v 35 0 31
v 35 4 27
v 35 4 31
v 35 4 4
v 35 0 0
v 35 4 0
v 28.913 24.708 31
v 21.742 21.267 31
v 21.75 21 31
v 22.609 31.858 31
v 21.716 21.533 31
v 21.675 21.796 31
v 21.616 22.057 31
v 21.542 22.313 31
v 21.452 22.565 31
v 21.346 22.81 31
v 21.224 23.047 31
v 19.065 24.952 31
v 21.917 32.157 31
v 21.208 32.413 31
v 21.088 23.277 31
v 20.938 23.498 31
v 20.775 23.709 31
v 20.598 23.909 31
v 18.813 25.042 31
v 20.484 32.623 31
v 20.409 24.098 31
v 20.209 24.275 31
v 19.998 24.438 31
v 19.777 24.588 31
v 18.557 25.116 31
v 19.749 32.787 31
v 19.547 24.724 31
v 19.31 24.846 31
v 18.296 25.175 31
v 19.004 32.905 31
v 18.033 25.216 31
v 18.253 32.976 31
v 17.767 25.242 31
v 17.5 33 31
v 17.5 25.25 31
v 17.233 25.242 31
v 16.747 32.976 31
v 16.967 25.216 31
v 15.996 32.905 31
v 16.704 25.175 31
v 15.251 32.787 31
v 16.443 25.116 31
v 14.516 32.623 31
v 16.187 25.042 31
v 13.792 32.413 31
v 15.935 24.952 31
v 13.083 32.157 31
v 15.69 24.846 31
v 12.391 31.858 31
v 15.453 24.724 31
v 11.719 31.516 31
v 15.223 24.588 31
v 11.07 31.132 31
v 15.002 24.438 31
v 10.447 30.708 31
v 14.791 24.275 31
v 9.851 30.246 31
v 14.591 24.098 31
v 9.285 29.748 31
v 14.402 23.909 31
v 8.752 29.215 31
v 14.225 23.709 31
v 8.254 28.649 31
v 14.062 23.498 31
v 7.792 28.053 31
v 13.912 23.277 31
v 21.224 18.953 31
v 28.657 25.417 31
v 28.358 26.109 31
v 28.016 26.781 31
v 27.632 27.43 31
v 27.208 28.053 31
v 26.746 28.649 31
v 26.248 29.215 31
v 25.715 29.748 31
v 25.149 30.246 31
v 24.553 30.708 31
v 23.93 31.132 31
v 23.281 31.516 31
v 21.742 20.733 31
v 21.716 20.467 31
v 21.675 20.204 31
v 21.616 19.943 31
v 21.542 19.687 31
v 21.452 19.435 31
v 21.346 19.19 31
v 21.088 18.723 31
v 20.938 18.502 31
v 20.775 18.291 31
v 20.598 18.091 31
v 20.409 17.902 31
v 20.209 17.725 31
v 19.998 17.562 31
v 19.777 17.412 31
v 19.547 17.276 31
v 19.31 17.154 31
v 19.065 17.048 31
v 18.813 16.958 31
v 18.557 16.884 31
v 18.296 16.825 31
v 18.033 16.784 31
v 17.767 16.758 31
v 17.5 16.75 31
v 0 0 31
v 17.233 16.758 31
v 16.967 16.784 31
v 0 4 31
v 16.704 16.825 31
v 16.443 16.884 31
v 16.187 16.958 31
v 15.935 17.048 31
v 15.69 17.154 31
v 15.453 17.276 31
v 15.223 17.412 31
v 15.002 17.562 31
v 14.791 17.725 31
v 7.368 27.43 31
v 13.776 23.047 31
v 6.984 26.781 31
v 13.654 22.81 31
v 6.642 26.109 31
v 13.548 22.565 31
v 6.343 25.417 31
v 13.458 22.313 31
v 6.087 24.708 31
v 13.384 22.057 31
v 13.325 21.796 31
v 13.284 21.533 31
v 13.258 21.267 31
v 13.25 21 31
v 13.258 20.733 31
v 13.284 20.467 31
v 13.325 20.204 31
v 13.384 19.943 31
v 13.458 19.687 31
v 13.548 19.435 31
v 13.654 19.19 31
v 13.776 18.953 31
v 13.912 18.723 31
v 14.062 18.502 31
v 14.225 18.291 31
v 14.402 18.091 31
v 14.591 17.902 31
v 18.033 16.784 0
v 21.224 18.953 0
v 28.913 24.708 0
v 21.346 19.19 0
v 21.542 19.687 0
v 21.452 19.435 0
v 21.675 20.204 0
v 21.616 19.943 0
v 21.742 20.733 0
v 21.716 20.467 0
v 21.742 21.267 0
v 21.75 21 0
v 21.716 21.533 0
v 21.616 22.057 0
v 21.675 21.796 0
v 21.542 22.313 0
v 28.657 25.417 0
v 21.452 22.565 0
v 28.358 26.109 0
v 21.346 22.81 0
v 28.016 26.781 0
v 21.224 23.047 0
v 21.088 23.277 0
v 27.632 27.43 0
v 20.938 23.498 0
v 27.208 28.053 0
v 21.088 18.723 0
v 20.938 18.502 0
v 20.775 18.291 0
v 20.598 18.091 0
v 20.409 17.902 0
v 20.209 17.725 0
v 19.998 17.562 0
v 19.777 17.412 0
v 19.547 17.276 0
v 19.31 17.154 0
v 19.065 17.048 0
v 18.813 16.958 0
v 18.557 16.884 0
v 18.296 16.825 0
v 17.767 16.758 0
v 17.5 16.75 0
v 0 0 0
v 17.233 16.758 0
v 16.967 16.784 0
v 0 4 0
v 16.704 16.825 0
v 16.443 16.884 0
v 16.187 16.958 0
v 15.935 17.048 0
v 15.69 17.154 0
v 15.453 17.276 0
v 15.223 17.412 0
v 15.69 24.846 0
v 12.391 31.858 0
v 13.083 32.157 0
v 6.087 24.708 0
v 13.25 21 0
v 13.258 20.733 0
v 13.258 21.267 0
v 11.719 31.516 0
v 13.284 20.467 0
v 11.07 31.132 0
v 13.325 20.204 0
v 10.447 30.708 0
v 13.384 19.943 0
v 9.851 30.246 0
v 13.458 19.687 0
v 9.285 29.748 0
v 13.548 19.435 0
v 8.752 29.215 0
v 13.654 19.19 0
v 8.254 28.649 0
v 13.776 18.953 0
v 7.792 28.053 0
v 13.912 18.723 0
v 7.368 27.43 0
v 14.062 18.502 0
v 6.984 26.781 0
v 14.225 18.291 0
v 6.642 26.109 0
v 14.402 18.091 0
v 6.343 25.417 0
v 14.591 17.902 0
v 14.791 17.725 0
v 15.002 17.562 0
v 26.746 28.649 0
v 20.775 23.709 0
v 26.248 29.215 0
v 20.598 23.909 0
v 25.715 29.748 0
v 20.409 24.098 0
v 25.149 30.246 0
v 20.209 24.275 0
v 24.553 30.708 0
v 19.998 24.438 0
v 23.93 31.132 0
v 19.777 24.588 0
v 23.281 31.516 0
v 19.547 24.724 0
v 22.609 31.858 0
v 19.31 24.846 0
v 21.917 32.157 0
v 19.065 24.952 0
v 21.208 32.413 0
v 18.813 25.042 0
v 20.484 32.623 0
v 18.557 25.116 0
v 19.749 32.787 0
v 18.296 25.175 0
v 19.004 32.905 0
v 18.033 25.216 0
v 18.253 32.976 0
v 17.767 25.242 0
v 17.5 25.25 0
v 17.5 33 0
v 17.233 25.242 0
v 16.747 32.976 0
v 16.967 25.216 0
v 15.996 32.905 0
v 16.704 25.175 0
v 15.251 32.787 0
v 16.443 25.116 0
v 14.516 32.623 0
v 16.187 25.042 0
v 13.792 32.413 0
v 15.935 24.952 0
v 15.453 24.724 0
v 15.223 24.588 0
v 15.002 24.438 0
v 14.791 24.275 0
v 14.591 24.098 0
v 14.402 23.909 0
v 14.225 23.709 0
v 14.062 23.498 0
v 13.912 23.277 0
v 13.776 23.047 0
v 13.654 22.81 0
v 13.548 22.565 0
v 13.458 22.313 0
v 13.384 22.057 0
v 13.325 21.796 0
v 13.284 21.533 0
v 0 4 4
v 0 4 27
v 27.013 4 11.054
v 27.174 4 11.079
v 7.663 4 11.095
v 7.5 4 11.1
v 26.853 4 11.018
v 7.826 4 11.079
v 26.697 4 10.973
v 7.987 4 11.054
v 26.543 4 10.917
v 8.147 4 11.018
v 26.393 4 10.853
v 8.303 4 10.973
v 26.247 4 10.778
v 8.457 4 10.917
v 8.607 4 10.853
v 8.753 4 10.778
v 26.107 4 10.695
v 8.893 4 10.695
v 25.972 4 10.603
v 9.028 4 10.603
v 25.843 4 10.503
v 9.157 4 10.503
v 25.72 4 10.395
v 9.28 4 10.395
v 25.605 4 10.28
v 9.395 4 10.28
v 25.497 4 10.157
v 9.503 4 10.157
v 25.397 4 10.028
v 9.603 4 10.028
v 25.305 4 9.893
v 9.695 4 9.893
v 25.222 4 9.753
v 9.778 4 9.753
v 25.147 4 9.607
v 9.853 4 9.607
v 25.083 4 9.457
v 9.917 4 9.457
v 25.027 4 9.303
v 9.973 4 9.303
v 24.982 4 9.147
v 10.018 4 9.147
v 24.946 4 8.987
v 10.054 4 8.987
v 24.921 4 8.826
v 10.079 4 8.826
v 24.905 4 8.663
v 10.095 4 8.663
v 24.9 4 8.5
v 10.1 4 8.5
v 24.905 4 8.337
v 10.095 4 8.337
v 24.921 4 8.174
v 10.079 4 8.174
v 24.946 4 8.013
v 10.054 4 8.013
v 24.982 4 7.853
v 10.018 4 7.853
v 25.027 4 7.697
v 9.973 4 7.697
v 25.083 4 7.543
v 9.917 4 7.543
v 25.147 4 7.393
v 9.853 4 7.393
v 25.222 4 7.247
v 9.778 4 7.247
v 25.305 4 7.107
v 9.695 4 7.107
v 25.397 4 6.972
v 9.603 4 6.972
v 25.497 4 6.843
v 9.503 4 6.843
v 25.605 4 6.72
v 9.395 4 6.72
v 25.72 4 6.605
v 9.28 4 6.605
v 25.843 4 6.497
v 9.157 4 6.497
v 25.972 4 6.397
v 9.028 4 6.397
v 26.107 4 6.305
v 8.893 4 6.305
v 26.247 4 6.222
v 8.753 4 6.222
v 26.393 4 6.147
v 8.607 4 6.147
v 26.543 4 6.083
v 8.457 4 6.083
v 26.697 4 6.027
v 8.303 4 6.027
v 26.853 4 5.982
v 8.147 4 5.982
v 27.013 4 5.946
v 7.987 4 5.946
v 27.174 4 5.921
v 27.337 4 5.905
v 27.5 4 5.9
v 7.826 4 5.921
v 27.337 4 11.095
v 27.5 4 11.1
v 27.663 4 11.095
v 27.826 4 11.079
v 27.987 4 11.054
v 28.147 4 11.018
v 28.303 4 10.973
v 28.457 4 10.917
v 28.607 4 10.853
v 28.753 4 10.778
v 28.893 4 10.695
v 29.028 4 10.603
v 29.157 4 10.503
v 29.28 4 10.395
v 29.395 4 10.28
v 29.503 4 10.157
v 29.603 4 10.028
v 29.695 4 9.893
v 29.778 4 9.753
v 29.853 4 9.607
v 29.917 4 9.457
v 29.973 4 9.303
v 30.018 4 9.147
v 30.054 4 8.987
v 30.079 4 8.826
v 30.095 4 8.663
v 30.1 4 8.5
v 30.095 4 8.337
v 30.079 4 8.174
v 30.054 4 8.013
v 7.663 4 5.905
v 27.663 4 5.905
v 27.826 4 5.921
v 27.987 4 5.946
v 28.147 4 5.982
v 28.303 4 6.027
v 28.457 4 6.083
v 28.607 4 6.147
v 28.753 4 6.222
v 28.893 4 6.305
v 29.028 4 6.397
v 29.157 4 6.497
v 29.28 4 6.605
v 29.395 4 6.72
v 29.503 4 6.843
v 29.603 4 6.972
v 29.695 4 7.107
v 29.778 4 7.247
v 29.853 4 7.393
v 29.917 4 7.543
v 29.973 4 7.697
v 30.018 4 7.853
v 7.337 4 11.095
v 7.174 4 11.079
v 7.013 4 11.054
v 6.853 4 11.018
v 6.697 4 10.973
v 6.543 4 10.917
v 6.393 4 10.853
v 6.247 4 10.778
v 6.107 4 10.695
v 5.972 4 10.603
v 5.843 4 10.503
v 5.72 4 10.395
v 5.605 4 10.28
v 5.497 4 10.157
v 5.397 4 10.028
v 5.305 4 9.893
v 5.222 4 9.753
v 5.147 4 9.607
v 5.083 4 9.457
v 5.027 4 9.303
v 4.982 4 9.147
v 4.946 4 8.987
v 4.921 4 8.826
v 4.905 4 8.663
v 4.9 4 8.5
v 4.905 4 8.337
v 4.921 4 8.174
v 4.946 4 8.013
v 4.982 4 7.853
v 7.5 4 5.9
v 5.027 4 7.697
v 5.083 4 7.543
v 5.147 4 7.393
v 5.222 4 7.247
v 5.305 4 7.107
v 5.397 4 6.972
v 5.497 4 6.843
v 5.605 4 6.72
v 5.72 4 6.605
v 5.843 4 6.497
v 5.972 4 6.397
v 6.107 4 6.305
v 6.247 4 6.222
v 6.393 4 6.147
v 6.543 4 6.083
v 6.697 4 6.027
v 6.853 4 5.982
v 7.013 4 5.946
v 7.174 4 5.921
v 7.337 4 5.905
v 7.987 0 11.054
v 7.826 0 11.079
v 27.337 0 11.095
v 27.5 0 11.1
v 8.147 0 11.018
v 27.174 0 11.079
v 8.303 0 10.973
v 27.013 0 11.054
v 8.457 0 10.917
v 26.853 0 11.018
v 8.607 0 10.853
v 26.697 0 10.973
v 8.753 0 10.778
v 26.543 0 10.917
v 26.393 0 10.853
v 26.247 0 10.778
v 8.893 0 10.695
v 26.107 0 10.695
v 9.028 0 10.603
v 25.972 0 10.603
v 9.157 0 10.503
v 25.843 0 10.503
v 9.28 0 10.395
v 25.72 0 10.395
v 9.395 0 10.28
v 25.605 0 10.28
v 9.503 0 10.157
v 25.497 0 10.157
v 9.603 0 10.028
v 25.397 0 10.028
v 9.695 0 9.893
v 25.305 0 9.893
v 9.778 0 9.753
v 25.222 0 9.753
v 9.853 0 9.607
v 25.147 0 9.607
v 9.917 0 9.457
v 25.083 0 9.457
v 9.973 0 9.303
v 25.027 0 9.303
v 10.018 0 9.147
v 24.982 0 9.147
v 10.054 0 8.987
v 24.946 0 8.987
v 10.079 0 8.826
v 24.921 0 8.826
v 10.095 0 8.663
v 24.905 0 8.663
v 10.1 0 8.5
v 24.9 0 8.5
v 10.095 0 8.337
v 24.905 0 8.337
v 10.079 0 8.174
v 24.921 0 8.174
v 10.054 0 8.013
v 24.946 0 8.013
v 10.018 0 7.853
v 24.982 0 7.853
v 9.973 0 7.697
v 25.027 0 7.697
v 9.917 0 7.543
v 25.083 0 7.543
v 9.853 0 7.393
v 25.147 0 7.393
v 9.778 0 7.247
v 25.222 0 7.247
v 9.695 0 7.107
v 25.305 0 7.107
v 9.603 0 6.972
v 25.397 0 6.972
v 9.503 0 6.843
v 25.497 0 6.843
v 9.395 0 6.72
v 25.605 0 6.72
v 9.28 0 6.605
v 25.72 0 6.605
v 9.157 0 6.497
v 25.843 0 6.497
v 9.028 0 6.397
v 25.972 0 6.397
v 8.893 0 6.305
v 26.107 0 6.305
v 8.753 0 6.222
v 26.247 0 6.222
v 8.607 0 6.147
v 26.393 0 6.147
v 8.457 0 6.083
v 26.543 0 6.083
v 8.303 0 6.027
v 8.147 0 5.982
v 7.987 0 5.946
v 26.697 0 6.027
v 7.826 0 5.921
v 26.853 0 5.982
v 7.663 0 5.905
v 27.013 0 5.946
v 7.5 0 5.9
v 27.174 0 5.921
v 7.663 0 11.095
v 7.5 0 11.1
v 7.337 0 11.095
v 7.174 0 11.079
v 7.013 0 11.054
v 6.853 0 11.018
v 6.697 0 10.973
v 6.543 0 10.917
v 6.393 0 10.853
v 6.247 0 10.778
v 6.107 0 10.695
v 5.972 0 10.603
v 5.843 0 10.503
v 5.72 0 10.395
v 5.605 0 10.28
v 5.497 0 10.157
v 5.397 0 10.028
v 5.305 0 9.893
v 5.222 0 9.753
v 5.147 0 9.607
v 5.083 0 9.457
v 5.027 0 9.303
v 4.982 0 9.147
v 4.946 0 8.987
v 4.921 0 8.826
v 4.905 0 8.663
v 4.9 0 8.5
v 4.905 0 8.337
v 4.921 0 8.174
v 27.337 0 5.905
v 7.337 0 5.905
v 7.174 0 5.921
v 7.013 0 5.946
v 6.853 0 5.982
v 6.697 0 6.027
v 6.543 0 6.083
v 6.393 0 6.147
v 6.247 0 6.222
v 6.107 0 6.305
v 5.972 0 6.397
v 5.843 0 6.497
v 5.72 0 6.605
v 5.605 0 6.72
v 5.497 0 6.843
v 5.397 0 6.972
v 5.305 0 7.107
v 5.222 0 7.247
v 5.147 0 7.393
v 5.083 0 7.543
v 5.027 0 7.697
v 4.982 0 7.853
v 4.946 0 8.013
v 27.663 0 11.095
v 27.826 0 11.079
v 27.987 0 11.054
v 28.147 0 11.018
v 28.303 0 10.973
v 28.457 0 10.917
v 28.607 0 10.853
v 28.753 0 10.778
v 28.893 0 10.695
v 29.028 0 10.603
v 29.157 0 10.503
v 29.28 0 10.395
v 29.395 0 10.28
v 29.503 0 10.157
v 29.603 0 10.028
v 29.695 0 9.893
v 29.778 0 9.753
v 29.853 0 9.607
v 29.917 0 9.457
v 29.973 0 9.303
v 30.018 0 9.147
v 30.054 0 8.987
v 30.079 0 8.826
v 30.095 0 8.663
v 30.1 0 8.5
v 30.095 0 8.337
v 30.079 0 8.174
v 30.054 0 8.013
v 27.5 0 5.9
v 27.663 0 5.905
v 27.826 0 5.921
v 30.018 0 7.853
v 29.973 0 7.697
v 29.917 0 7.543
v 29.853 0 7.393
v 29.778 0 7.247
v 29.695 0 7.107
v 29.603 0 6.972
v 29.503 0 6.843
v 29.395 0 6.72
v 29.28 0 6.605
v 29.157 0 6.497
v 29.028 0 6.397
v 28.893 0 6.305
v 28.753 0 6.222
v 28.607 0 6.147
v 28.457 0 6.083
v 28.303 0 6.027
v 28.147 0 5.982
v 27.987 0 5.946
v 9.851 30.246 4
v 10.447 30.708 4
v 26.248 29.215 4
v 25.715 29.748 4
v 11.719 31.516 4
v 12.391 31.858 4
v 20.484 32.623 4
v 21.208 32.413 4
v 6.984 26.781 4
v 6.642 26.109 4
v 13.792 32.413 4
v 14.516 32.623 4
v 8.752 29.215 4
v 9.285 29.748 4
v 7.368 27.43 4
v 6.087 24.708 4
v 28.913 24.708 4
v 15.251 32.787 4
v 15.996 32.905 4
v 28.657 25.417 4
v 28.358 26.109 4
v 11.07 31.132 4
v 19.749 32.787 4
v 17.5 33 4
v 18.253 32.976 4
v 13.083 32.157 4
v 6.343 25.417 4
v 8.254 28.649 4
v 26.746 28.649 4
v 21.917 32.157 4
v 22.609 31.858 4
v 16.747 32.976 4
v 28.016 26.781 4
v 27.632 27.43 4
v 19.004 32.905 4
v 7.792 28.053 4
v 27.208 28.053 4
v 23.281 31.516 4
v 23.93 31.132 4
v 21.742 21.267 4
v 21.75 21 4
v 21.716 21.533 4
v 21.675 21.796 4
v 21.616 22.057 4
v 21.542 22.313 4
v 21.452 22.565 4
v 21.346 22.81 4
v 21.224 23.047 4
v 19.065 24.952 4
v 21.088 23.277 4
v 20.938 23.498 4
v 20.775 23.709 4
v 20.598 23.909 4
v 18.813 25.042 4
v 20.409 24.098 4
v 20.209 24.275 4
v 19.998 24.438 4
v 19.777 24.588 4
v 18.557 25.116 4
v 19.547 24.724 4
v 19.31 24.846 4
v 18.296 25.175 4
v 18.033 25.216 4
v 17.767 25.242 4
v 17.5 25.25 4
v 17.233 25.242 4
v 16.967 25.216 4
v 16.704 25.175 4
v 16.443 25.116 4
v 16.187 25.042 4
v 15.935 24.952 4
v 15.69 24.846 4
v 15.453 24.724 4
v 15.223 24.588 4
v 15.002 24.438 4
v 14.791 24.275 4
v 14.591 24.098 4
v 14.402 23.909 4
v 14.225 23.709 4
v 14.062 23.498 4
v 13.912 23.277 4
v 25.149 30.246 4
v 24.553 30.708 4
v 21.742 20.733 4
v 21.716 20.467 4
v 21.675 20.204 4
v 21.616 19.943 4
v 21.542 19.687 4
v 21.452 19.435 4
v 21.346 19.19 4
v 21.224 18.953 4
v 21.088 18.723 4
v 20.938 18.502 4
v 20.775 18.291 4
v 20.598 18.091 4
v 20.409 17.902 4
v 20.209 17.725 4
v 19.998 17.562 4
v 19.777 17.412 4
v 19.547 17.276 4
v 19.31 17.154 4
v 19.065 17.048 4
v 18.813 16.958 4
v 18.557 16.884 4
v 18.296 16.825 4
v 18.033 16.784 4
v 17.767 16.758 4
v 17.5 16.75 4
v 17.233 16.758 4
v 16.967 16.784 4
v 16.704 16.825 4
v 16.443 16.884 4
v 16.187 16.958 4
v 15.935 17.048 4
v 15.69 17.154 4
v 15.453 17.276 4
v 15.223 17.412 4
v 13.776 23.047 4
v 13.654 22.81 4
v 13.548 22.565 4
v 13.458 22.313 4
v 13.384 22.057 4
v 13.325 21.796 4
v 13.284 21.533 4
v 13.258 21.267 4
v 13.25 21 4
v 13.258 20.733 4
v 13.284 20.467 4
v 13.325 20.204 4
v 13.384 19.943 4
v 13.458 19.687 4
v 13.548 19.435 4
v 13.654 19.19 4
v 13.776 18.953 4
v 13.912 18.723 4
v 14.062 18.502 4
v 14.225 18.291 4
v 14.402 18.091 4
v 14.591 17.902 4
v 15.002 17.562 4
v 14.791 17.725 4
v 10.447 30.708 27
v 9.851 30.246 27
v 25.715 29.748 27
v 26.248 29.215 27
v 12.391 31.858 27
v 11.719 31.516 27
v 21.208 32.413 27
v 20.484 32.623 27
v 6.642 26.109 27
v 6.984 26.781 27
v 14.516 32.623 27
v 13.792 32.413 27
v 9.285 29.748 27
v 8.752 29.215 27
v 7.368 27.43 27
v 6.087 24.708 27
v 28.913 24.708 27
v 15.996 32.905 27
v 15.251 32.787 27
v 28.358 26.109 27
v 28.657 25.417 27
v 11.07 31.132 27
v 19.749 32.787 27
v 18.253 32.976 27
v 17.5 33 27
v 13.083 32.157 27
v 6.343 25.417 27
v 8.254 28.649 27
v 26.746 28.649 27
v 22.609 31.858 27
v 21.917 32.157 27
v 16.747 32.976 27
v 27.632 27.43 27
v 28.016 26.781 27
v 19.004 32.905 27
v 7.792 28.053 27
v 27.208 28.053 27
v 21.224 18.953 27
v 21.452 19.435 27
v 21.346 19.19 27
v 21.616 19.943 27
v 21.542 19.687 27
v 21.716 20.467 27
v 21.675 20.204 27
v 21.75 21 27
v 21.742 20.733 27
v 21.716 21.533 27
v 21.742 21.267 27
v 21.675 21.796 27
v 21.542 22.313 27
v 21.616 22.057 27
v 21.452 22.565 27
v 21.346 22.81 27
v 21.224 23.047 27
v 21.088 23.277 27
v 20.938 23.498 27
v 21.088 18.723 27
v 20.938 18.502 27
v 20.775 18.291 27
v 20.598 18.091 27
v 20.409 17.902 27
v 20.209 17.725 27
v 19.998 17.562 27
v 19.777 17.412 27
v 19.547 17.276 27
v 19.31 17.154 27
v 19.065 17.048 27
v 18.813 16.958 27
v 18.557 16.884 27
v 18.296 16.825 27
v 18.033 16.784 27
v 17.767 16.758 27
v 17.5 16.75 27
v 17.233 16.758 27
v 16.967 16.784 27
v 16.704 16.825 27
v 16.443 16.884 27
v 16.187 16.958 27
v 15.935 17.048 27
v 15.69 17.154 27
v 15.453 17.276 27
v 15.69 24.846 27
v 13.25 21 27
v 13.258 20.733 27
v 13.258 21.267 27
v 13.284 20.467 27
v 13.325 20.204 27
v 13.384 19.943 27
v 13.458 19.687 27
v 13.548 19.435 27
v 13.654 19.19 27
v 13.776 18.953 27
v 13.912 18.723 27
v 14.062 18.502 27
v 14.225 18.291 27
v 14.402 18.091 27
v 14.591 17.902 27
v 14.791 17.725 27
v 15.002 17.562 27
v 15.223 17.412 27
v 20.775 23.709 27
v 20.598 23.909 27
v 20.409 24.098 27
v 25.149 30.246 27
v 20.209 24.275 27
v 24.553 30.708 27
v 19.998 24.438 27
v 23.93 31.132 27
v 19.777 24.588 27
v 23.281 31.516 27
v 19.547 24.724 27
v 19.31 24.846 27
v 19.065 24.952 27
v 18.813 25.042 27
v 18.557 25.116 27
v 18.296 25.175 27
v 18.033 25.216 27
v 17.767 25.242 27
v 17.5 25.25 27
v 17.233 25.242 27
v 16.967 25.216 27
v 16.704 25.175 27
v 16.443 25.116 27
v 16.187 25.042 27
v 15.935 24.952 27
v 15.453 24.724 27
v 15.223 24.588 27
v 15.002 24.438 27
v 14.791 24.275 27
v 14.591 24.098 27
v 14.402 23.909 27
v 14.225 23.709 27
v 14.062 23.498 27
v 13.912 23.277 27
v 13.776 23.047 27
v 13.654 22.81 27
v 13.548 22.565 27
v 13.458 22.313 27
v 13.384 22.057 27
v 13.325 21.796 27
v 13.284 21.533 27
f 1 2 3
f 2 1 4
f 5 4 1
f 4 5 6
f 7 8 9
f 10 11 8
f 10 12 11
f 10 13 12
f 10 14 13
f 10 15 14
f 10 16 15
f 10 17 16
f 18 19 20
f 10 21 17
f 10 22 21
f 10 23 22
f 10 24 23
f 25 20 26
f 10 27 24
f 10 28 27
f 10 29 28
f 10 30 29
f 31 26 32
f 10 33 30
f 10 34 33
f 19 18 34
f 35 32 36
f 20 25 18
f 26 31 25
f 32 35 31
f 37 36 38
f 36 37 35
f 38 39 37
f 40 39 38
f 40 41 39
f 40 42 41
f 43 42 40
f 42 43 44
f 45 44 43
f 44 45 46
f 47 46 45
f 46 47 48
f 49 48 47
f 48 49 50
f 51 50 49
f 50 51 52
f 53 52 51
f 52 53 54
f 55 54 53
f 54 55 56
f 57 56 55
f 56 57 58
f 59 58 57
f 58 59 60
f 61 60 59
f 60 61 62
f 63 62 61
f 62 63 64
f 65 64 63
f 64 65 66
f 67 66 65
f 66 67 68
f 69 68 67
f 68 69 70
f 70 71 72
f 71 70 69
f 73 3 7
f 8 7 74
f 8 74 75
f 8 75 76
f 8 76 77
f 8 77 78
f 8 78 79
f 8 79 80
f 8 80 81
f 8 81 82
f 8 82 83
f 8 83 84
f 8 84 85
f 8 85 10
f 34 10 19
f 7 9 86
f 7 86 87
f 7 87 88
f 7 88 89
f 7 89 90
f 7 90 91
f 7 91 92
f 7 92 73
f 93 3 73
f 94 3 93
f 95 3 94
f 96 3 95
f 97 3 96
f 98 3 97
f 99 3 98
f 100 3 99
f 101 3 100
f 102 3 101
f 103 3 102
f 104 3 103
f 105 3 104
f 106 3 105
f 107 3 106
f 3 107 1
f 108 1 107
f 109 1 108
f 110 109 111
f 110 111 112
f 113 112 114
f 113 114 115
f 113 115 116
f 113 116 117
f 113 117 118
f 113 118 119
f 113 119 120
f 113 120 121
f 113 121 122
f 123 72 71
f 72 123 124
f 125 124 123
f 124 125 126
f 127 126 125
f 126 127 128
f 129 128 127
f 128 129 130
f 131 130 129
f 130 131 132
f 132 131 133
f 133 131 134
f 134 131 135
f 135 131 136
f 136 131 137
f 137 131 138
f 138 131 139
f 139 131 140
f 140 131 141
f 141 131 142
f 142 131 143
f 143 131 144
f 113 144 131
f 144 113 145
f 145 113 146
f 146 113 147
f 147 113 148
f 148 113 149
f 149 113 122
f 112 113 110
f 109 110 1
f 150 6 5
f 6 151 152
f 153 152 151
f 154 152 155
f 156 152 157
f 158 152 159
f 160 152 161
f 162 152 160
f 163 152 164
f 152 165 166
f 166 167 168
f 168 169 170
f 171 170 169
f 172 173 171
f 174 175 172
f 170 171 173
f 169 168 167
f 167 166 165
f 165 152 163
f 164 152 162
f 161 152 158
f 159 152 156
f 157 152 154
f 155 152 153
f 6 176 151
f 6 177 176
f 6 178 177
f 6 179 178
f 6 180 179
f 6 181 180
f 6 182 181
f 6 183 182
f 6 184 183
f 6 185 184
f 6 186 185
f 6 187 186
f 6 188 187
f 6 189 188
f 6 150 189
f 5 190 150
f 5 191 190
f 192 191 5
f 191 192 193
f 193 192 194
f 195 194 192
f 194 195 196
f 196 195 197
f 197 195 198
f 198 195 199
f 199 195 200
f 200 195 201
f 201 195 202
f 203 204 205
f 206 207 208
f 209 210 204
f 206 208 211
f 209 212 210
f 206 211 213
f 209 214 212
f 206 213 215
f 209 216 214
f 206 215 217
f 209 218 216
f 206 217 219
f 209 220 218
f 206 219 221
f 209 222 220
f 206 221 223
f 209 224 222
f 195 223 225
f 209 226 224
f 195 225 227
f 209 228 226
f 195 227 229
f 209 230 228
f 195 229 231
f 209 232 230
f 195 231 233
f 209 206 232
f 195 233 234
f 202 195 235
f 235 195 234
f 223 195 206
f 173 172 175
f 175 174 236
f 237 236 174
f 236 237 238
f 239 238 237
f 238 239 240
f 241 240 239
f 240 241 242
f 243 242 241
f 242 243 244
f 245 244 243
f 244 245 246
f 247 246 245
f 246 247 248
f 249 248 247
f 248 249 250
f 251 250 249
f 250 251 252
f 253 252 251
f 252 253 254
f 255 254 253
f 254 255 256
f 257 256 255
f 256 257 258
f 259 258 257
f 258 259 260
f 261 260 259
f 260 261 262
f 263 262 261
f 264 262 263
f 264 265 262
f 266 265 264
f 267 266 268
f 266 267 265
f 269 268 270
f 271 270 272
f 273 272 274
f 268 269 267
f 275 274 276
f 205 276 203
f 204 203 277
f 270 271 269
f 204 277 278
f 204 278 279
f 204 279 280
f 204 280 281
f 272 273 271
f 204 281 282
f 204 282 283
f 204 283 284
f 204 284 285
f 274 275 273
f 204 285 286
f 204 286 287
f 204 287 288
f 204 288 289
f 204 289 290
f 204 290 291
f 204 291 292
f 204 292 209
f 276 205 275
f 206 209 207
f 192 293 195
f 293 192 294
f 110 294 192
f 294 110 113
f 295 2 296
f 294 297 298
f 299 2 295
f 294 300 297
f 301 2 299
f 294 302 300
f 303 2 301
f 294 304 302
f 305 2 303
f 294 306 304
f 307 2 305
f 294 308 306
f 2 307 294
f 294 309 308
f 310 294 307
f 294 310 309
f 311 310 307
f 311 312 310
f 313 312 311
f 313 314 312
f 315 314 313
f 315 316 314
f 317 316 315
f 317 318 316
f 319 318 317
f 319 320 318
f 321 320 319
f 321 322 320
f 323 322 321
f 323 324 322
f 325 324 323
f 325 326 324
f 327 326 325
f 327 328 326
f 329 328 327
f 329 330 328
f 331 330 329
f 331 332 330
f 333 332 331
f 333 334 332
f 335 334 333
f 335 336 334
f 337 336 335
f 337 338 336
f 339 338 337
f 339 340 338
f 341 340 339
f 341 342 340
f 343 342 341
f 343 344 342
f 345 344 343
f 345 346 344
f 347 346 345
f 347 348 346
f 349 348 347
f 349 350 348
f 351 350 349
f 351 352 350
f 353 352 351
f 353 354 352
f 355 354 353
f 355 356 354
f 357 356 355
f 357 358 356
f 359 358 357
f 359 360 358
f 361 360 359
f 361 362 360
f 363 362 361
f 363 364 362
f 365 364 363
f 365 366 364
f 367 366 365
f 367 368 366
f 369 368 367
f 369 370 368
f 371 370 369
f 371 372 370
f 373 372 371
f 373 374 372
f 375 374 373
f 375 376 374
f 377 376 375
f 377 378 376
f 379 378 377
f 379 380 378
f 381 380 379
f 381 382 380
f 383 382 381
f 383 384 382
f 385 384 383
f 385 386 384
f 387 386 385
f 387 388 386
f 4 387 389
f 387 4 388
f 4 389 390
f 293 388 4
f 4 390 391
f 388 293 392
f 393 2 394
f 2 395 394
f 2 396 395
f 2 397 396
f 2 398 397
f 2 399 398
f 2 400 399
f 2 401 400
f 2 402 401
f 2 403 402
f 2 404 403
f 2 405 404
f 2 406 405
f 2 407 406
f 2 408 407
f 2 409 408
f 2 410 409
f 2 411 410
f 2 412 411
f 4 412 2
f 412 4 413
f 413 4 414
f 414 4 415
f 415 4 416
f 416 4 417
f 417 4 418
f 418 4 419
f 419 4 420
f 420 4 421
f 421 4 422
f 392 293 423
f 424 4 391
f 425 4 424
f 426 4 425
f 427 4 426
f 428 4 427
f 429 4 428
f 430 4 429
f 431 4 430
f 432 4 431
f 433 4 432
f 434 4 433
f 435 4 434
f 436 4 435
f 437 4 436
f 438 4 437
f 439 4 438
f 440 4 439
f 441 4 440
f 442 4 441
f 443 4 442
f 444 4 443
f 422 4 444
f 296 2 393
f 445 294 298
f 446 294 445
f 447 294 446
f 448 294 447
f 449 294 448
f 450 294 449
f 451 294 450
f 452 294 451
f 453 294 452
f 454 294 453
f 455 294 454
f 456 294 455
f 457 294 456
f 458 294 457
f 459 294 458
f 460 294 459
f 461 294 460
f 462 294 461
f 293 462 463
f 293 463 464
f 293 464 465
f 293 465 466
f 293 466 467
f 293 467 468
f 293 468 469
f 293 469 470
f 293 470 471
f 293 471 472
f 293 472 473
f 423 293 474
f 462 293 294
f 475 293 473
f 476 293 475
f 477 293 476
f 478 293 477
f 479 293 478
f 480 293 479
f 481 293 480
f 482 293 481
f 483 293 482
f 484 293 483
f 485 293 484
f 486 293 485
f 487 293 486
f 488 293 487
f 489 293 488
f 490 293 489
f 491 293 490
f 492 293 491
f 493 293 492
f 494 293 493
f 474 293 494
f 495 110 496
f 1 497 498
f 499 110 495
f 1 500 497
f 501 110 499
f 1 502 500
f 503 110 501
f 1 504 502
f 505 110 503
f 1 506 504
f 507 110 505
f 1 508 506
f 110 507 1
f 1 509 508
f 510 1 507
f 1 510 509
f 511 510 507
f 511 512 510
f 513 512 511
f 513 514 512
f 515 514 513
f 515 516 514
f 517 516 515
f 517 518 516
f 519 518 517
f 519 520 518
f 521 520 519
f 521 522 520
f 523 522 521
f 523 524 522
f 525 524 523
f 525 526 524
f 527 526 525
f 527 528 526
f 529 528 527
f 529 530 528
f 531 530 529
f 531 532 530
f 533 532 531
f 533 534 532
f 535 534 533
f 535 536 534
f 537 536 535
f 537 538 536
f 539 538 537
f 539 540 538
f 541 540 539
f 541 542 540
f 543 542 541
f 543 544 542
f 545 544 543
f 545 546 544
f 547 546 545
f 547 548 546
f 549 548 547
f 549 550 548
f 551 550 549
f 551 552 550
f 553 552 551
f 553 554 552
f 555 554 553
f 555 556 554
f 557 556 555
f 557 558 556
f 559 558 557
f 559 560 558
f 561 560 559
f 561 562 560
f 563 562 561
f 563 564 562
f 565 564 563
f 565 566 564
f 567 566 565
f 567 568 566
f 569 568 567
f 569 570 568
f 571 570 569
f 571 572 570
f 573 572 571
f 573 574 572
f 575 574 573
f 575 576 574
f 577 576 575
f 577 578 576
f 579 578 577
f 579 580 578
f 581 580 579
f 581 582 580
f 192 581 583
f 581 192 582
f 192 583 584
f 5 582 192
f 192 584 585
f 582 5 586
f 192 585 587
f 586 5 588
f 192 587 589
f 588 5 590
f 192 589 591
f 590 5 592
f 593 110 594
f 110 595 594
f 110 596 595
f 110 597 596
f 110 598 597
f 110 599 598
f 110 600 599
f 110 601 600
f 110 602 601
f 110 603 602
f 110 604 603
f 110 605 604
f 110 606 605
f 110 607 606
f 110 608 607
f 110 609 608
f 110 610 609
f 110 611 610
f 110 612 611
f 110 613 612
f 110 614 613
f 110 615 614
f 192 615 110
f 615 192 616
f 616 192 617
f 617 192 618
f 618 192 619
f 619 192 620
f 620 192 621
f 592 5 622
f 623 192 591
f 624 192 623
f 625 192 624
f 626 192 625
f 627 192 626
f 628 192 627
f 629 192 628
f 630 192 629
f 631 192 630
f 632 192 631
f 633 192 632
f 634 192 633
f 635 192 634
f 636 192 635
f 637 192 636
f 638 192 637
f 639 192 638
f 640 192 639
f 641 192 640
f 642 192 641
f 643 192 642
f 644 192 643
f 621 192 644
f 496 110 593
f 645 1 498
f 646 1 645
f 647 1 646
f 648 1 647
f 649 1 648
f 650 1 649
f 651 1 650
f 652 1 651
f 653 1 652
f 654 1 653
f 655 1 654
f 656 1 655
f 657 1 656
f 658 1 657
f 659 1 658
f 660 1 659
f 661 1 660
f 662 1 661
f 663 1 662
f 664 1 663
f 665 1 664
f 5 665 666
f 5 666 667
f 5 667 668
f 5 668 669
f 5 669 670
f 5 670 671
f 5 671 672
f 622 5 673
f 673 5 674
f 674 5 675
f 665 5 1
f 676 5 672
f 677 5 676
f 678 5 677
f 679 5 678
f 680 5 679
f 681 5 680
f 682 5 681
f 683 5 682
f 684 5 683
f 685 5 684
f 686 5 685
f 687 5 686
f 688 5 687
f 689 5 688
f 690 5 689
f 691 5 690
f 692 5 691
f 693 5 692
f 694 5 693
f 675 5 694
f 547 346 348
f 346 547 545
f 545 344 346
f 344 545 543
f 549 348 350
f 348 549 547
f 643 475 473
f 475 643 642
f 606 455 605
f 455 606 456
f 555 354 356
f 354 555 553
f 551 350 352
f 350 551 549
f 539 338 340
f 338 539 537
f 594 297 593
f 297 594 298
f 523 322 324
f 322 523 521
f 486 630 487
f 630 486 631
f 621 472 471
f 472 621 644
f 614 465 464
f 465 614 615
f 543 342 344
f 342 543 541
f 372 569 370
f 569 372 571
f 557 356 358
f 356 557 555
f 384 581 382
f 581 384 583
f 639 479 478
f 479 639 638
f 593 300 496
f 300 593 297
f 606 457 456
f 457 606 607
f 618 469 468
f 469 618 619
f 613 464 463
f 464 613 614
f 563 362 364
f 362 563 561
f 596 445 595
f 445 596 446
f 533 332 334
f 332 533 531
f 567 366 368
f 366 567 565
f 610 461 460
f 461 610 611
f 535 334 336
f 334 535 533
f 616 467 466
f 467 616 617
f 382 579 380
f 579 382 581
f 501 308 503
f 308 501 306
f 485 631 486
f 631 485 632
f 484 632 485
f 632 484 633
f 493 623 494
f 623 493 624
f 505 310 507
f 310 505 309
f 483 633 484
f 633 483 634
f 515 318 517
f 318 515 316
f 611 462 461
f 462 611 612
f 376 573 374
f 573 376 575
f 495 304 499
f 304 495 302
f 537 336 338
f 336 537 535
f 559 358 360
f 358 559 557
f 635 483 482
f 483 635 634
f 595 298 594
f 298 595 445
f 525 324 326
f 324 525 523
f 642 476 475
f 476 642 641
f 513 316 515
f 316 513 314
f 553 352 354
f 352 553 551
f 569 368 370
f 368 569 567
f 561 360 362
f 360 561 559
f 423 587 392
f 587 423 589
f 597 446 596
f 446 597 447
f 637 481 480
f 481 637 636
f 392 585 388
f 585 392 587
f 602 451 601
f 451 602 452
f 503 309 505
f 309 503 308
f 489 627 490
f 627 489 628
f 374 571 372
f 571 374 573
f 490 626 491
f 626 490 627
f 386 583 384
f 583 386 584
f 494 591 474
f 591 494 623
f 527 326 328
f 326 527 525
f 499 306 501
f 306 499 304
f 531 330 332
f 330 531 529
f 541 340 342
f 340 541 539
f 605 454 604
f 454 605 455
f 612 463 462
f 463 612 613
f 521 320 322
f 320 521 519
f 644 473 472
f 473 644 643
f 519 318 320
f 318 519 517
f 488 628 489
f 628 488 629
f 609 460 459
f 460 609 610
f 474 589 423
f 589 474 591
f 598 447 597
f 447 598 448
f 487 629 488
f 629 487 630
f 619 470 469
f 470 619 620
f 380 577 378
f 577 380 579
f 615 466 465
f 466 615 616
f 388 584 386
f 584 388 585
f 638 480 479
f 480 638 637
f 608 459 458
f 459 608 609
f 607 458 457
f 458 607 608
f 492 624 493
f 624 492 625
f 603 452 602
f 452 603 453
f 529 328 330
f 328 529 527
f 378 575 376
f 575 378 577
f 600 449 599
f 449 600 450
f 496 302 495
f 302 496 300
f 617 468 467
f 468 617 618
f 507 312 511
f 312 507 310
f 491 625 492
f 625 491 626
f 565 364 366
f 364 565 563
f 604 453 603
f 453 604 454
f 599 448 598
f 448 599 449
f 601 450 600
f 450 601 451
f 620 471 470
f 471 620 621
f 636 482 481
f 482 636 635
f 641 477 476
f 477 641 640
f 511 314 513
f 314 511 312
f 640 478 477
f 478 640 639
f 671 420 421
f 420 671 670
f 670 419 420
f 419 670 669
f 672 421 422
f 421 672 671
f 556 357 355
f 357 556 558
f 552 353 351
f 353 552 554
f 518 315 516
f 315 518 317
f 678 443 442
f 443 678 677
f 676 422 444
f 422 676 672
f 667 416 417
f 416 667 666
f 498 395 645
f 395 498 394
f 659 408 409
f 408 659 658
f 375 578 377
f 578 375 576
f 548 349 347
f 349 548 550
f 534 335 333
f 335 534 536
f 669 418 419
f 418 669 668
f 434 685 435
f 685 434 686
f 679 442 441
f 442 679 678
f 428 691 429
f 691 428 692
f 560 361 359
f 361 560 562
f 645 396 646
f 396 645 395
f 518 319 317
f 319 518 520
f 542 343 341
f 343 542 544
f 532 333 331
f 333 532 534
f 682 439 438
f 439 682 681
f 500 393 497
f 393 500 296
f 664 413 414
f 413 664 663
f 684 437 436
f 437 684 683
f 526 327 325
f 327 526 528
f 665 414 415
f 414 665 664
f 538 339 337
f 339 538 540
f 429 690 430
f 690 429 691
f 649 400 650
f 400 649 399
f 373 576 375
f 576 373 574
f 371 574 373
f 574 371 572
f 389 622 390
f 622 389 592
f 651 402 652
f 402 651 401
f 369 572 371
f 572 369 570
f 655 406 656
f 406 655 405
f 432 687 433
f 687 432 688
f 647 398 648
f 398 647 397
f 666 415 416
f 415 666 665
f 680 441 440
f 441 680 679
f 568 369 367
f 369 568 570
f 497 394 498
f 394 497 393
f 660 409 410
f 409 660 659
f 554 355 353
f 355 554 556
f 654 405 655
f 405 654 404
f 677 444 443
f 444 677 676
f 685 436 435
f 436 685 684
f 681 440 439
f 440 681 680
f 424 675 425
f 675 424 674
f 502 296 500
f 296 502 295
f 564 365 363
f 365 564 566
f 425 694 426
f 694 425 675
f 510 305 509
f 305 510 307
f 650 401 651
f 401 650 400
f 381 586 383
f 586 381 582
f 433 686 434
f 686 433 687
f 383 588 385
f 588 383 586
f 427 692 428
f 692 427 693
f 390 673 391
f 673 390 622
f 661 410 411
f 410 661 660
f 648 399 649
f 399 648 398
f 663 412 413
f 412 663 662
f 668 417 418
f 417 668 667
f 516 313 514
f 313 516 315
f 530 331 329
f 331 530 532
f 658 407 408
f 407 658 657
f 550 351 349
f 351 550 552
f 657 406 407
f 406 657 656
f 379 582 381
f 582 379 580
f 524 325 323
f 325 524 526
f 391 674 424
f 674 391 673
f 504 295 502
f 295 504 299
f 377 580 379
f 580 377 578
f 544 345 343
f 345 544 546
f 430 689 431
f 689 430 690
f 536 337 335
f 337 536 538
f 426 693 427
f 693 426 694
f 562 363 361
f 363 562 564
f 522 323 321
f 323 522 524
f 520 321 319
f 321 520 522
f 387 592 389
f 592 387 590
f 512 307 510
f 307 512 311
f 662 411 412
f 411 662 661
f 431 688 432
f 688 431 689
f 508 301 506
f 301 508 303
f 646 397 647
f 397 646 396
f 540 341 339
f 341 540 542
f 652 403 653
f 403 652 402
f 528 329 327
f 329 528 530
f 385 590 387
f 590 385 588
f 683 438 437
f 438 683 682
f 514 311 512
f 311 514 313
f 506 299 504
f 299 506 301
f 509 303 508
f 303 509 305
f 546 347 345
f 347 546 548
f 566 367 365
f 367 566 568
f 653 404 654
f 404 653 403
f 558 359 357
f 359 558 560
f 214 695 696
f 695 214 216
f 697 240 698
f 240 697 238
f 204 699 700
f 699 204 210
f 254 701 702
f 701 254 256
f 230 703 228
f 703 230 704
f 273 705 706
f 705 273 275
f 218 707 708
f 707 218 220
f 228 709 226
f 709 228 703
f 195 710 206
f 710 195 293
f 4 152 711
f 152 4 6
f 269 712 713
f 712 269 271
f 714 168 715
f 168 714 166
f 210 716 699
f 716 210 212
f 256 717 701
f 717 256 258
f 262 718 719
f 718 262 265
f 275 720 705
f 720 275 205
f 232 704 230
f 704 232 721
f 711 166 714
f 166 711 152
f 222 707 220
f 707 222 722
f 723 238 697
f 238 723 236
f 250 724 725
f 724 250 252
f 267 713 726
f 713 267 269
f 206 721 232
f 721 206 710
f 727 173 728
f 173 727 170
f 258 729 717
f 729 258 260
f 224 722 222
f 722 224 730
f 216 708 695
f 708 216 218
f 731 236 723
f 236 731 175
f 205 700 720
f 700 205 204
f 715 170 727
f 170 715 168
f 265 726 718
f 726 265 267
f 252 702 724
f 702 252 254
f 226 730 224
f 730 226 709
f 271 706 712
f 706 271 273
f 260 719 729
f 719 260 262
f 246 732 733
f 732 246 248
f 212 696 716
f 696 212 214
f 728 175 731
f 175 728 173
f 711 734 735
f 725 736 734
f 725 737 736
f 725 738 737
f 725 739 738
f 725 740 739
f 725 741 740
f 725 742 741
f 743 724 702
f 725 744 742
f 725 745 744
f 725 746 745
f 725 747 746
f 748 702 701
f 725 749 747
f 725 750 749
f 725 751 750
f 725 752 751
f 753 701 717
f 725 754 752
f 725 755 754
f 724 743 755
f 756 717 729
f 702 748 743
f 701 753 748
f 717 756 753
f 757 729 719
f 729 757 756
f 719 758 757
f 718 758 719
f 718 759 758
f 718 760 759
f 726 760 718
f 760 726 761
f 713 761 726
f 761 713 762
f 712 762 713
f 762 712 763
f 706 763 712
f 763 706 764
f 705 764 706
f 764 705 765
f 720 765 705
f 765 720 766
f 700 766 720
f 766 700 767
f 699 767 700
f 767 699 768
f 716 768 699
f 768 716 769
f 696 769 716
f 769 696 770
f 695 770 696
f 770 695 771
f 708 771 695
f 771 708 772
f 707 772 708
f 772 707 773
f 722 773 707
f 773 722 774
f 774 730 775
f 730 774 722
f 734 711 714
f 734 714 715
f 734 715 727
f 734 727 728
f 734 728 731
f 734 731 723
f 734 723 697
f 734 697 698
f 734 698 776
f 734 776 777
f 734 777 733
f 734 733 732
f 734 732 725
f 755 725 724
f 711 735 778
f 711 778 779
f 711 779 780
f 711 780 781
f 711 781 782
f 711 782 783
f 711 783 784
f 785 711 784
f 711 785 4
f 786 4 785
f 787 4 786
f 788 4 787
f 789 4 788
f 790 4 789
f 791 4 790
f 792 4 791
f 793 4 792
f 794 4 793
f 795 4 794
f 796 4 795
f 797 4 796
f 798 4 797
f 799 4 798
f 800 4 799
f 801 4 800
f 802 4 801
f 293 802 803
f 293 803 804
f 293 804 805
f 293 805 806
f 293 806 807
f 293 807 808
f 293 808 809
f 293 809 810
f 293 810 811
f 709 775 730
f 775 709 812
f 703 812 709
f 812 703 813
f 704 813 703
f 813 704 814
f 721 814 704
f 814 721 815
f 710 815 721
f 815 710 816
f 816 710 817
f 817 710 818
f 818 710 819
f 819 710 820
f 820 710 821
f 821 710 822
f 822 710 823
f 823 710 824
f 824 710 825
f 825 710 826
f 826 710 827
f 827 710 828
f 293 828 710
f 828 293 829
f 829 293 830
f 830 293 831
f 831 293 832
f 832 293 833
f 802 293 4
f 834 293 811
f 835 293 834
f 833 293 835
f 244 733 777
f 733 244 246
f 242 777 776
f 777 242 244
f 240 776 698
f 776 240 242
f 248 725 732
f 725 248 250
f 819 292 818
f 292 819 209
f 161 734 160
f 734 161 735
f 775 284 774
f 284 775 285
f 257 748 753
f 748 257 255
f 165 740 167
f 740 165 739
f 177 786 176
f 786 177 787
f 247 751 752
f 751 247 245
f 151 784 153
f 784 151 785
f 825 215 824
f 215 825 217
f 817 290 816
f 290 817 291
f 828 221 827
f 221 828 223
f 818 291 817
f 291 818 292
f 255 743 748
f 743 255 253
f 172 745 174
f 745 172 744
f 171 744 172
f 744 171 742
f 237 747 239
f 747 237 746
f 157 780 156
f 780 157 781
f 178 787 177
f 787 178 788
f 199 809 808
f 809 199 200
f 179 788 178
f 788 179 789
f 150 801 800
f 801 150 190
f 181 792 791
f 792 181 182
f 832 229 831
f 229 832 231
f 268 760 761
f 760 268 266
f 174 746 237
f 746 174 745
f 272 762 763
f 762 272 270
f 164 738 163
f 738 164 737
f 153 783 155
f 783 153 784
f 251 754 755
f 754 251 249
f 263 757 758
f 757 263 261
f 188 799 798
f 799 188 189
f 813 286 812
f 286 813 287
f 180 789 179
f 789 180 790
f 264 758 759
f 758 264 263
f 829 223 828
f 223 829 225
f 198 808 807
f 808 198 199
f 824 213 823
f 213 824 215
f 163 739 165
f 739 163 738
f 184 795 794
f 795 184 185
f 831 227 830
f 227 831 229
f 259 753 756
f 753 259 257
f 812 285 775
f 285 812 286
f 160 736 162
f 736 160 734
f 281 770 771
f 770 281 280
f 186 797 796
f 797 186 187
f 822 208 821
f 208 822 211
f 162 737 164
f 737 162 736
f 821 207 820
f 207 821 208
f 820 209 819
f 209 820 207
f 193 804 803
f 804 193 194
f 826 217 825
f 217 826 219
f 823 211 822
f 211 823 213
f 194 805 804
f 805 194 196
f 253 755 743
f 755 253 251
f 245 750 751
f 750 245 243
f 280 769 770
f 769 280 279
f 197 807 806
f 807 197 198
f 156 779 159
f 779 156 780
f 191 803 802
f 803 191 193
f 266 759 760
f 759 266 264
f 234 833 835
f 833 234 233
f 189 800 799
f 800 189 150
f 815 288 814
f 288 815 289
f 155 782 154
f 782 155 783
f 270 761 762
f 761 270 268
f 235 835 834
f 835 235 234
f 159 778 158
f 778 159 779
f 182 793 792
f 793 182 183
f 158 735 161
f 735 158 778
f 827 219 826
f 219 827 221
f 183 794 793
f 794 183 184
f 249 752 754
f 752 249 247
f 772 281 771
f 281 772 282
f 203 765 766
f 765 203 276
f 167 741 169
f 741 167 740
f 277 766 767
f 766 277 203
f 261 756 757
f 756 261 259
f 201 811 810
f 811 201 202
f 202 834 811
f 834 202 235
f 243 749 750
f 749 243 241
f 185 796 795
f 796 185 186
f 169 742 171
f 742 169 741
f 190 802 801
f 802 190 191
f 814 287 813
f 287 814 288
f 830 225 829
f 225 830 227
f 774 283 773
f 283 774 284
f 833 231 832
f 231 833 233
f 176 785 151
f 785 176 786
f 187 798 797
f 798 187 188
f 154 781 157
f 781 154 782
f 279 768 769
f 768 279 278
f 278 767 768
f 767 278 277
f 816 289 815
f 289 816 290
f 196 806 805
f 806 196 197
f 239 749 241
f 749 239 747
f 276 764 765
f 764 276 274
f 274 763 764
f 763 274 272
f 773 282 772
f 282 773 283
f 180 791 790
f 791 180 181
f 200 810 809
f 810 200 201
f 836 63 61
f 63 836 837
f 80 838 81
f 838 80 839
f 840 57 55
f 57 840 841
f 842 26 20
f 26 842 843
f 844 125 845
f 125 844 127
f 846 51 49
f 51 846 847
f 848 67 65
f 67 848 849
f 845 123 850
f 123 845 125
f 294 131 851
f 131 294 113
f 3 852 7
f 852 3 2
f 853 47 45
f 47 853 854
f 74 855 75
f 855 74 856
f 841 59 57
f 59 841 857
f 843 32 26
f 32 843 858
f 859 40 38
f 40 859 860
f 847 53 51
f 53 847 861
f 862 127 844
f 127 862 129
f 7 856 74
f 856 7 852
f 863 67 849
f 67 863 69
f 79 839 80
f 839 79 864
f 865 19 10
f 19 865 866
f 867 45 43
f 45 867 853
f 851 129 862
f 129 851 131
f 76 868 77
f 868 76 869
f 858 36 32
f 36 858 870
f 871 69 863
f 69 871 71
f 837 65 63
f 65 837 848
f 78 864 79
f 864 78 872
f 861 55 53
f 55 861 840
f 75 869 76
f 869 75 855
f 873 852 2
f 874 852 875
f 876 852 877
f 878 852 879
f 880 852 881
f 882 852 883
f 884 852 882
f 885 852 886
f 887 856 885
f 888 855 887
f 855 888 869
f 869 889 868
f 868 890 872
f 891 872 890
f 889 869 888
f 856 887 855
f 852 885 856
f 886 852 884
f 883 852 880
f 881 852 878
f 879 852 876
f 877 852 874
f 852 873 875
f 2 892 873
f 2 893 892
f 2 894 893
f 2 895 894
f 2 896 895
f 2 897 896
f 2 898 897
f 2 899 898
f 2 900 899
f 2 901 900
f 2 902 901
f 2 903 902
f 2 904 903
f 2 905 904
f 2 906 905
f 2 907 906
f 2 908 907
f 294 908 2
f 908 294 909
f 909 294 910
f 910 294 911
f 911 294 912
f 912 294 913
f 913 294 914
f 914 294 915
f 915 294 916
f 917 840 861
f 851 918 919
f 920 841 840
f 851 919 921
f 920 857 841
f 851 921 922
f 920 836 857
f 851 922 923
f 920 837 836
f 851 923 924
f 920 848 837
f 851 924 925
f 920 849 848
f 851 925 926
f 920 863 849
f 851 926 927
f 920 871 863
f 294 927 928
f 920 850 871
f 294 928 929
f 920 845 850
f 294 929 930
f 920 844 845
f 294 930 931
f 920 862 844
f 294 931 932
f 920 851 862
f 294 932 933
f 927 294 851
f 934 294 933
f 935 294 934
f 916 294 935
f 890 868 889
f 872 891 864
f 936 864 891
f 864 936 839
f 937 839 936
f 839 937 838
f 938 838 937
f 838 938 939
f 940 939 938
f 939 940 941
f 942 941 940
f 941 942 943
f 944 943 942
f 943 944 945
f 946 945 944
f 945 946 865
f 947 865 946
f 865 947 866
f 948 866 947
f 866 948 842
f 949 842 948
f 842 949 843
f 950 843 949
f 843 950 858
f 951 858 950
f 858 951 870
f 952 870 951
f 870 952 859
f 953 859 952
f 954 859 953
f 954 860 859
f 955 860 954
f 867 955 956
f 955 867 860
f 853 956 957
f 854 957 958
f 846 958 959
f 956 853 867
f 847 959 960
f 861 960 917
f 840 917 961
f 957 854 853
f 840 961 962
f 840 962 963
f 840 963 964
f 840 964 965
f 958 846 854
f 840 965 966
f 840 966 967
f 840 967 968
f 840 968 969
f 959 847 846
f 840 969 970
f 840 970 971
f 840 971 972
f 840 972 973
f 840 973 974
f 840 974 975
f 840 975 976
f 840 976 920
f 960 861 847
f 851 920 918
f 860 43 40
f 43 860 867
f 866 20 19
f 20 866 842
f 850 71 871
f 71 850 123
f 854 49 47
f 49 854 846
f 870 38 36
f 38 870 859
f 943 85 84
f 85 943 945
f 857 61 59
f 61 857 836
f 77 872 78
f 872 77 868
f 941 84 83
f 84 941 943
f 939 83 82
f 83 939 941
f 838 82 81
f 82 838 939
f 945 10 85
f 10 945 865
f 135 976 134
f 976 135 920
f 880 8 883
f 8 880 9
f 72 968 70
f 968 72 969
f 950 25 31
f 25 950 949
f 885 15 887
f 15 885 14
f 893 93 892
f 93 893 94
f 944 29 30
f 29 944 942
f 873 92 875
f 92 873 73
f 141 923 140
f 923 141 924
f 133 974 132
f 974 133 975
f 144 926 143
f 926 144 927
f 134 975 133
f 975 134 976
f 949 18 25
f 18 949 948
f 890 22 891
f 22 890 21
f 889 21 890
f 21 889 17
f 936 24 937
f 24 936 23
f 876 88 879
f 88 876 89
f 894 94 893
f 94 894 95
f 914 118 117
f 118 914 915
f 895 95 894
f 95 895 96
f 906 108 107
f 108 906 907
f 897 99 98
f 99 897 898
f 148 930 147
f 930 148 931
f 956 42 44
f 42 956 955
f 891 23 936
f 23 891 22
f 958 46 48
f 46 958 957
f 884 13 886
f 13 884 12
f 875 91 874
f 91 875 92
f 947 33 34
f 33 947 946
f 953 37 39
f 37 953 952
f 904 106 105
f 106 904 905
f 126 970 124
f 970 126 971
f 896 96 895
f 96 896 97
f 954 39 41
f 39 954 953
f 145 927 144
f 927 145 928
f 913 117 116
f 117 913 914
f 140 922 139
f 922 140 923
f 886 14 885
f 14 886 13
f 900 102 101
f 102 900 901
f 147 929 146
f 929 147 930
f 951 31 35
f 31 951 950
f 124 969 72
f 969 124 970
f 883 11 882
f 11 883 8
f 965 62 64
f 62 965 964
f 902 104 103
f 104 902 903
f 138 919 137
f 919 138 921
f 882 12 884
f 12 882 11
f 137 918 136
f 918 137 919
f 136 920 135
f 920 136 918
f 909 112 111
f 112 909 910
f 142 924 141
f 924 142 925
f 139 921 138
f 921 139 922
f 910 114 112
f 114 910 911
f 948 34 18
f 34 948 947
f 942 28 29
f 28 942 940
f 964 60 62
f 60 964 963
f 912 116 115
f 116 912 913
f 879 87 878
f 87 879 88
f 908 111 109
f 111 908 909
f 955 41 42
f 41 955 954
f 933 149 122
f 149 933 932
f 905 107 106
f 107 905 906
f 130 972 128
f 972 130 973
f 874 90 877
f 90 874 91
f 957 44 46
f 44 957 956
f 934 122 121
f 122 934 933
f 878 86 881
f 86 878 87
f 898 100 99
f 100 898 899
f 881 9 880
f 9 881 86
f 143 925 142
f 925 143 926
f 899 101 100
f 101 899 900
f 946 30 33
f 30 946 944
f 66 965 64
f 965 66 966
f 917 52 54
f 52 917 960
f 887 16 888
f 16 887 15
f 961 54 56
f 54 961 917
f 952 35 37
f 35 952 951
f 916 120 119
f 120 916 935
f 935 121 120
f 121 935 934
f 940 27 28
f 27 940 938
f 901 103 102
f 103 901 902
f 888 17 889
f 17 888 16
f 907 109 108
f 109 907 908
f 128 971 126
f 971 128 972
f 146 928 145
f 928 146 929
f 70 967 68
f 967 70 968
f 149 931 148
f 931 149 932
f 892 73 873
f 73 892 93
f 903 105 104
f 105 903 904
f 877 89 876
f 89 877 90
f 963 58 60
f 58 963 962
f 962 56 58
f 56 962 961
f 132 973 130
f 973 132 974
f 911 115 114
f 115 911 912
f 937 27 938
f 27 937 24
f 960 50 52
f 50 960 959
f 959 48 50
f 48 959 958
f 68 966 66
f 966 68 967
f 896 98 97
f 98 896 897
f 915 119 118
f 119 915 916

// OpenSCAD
/* idler-gantry-v2   */

$fn=100;

bearing_thickness = 7.0;
bearing_od = 22.0;
bearing_id = 8.0;
bearing_shaft_collar= 11.5;
bearing_epsilon = 1.0;

bearing_centre_offset = bearing_od / 2.0 + 10;
bearing_centre_hole_r = 4.25;

mount_hole_pitch = 20.0;
mount_hole_r = 2.6;

sqrt2 = sqrt(2.0);

thickness = 4.0;
width = 35.0;
height = bearing_thickness * 4.0 + 3.0;

union () {
	difference() {
		cube([width, thickness, height]);
		translate([width / 2.0 - mount_hole_pitch / 2.0, 0, thickness + 1.0 + bearing_thickness / 2.0]) rotate([-90, 0, 0]) cylinder(r = mount_hole_r, h = thickness);
		translate([width / 2.0 + mount_hole_pitch / 2.0, 0, thickness + 1.0 + bearing_thickness / 2.0]) rotate([-90, 0, 0]) cylinder(r = mount_hole_r, h = thickness);
	}

	idler_plate();

	translate([0.0, 0.0, height - thickness]) idler_plate();

}

module idler_plate() {
	difference() {
		hull() {

			difference () {
				translate ([width / 2.0, - width / 2.0 + thickness, 0.0]) rotate ([0.0, 0.0, 45.0]) cube([width / sqrt2, width / sqrt2, thickness]);
				mirror([0, 1, 0]) cube([width, width / sqrt2 - thickness, thickness]);
			}

			translate ([width / 2.0, bearing_centre_offset, 0]) cylinder(r = bearing_od / 2.0 + bearing_epsilon, h = thickness);
		}
		translate([width / 2.0, bearing_centre_offset, 0.0]) cylinder(r = bearing_centre_hole_r, h = thickness);
	}
}
